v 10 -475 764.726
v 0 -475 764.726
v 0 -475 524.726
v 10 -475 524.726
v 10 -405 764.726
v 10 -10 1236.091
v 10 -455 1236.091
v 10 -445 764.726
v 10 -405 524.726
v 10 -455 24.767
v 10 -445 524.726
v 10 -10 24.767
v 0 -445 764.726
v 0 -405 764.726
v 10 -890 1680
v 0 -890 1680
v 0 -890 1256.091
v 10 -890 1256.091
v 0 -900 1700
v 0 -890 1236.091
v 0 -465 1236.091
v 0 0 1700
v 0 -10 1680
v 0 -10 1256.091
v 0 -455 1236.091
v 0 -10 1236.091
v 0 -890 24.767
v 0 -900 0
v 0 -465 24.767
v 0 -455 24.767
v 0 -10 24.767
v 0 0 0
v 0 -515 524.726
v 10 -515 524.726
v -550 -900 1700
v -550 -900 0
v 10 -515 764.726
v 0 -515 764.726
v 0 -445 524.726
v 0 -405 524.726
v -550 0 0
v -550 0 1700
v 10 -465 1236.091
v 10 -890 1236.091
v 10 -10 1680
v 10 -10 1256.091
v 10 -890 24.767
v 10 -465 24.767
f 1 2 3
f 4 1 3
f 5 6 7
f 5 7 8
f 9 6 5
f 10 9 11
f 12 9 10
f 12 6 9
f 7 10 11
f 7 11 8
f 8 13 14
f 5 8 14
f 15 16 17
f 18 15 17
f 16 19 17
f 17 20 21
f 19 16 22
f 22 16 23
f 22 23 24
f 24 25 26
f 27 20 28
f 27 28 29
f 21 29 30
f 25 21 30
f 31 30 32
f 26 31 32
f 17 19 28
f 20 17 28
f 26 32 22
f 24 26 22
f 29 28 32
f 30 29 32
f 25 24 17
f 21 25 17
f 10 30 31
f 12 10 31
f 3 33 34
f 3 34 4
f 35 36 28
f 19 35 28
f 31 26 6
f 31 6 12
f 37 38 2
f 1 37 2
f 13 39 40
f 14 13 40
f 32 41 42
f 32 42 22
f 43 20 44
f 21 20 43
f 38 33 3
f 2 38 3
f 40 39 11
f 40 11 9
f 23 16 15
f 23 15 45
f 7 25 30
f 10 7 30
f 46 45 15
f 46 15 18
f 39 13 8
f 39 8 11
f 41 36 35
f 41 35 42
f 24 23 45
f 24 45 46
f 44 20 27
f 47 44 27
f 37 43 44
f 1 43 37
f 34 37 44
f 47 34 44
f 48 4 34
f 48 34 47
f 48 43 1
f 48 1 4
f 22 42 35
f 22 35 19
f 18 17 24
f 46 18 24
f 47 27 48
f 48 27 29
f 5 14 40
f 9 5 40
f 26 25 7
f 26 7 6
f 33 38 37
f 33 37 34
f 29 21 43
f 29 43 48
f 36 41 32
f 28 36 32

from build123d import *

# Parameters (mm, degrees)
SKETCH1_W           = 550
SKETCH1_H           = 900
BOSS_EXTRUDE1_DEPTH = 1700
SKETCH2_W           = 423.908990982
SKETCH2_H           = 880
SKETCH2_W_2         = 1211.324213984
SKETCH2_H_2         = 445
SKETCH2_W_3         = 240
SKETCH2_H_3         = 40
SKETCH2_H_4         = 425
BOSS_EXTRUDE2_DEPTH = 10


with BuildPart() as part:
    # Sketch1 → Boss-Extrude1 (new body)
    with BuildSketch(Plane.XY):
        with Locations((-275, -450)):
            Rectangle(SKETCH1_W, SKETCH1_H)
    extrude(amount=BOSS_EXTRUDE1_DEPTH)

    # Sketch2 → Boss-Extrude2 (add)
    with BuildSketch(Plane(origin=(0, 0, 0), x_dir=(0, 0, -1), z_dir=(1, 0, 0))):
        with Locations((-1468.045504509, -450)):
            Rectangle(SKETCH2_W, SKETCH2_H)
        with Locations((-630.428902026, -232.5)):
            Rectangle(SKETCH2_W_2, SKETCH2_H_2)
        with Locations((-644.725938912, -425)):
            Rectangle(SKETCH2_W_3, SKETCH2_H_3, mode=Mode.SUBTRACT)
        with Locations((-630.428902026, -677.5)):
            Rectangle(SKETCH2_W_2, SKETCH2_H_4)
        with Locations((-644.725938912, -495)):
            Rectangle(SKETCH2_W_3, SKETCH2_H_3, mode=Mode.SUBTRACT)
    extrude(amount=BOSS_EXTRUDE2_DEPTH)


solid = part.part
